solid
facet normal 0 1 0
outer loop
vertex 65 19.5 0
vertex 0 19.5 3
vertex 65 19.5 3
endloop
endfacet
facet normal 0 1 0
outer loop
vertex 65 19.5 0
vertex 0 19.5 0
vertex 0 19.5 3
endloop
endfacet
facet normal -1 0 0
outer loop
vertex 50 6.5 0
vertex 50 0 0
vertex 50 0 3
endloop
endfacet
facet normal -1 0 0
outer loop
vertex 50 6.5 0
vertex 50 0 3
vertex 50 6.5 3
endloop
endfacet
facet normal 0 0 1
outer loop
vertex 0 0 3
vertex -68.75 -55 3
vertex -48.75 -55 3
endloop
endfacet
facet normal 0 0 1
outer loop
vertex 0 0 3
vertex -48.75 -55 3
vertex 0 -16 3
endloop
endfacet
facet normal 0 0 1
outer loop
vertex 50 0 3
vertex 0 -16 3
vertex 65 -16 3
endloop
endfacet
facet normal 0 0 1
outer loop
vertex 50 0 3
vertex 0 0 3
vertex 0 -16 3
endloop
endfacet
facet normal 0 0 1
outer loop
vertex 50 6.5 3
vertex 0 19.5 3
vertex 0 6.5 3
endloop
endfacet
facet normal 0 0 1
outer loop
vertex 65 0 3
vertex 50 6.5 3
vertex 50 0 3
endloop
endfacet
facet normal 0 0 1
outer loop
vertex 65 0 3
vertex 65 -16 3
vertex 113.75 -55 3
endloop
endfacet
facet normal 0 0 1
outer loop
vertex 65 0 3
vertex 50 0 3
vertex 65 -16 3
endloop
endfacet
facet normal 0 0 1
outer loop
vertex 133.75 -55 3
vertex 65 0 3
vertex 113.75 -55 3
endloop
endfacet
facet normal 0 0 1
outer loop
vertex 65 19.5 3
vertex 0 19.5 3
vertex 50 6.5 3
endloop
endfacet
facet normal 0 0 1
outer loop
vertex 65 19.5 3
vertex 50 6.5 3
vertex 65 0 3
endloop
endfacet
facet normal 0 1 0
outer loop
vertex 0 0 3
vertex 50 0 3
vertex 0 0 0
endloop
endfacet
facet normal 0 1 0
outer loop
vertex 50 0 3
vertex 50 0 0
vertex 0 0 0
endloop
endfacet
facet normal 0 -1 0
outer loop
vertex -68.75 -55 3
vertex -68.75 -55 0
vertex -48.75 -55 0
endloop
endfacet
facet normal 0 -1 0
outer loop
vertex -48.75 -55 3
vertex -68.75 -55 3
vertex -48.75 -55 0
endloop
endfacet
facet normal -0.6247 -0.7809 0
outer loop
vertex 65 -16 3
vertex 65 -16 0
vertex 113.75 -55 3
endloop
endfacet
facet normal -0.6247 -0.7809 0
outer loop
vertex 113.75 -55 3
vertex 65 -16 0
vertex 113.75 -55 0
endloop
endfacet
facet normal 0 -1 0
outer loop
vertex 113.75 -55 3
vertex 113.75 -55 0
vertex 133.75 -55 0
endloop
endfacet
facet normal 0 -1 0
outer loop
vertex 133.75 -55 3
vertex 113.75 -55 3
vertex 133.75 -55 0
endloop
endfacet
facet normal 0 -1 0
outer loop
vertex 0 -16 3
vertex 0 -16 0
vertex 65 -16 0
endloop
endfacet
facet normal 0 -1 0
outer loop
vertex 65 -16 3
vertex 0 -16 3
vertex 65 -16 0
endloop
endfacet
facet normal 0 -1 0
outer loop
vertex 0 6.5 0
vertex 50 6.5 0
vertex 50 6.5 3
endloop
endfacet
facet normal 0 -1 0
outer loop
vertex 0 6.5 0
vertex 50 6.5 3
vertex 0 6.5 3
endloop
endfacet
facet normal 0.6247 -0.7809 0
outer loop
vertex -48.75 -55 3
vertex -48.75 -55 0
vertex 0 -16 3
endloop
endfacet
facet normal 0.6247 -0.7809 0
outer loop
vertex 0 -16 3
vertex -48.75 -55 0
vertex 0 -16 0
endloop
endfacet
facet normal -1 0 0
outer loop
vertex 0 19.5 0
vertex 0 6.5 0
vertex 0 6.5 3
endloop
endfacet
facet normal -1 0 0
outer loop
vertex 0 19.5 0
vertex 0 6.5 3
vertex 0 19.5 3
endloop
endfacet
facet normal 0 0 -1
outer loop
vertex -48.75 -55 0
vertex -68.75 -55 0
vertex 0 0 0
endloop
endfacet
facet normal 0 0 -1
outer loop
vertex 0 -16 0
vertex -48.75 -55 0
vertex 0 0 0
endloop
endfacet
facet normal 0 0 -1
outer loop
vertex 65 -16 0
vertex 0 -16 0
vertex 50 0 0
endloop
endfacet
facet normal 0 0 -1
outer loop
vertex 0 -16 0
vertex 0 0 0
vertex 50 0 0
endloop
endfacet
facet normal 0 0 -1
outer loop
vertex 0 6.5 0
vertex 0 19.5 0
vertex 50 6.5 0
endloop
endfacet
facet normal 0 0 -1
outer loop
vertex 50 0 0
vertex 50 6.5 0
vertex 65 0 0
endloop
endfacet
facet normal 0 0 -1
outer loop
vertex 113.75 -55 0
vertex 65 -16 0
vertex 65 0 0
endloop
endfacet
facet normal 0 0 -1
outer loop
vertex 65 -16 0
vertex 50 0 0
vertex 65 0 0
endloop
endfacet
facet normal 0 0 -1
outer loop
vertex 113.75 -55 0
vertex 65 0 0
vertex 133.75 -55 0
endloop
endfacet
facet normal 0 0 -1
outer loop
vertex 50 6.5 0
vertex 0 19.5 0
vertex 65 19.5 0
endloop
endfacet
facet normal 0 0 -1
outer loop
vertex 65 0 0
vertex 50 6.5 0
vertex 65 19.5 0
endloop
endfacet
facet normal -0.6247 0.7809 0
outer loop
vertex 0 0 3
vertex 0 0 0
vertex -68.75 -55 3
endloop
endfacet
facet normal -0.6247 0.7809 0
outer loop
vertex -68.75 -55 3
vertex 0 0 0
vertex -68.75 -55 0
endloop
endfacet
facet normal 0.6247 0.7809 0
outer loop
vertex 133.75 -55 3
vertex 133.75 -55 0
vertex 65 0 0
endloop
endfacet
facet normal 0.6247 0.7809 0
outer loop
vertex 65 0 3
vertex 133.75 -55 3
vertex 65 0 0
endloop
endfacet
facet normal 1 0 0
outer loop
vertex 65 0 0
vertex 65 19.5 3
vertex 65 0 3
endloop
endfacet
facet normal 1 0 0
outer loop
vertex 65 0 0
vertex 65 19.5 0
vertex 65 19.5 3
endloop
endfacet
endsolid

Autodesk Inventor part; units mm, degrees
ref_plane "YZ Plane" through (0, 0, 0) normal (1, 0, 0) x (0, 1, 0)
ref_plane "XZ Plane" through (0, 0, 0) normal (0, 1, 0) x (-1, 0, 0)
ref_plane "XY Plane" through (0, 0, 0) normal (0, 0, 1) x (1, 0, 0)
sketch "Sketch1" plane through (0, 0, 0) normal (0, 0, 1) x (1, 0, 0)
  line L0 (0, 19.5) -> (50, 19.5)
  line L1 (50, 19.5) -> (50, 6.5)
  line L2 (50, 6.5) -> (0, 6.5)
  line L3 (0, 6.5) -> (0, 19.5)
  line L4 (50, 19.5) -> (65, 19.5)
  line L5 (65, 19.5) -> (65, 0)
  line L6 (65, 0) -> (50, 0)
  line L7 (50, 0) -> (50, 19.5)
  line L8 (65, 0) -> (0, 0)
  line L9 (0, 0) -> (0, -16)
  line L10 (0, -16) -> (65, -16)
  line L11 (65, -16) -> (65, 0)
  line L12 (0, 0) -> (-68.75, -55)
  line L13 (-68.75, -55) -> (-48.75, -55)
  line L14 (-48.75, -55) -> (0, -16)
  line L15 (65, -16) -> (113.75, -55)
  line L16 (113.75, -55) -> (133.75, -55)
  line L17 (133.75, -55) -> (65, 0)
  point P0 (50, 6.5)
  point P1 (50, 0)
  dimension "d0" = 6.5
  dimension "d1" = 13
  dimension "d2" = 50
  dimension "d3" = 15
  dimension "d4" = 16
  dimension "d5" = 20
  dimension "d6" = 20
  dimension "d7" = 55
extrude "Extrusion1" add sketch "Sketch1" along normal blind 3
properties part number "Support_base"
